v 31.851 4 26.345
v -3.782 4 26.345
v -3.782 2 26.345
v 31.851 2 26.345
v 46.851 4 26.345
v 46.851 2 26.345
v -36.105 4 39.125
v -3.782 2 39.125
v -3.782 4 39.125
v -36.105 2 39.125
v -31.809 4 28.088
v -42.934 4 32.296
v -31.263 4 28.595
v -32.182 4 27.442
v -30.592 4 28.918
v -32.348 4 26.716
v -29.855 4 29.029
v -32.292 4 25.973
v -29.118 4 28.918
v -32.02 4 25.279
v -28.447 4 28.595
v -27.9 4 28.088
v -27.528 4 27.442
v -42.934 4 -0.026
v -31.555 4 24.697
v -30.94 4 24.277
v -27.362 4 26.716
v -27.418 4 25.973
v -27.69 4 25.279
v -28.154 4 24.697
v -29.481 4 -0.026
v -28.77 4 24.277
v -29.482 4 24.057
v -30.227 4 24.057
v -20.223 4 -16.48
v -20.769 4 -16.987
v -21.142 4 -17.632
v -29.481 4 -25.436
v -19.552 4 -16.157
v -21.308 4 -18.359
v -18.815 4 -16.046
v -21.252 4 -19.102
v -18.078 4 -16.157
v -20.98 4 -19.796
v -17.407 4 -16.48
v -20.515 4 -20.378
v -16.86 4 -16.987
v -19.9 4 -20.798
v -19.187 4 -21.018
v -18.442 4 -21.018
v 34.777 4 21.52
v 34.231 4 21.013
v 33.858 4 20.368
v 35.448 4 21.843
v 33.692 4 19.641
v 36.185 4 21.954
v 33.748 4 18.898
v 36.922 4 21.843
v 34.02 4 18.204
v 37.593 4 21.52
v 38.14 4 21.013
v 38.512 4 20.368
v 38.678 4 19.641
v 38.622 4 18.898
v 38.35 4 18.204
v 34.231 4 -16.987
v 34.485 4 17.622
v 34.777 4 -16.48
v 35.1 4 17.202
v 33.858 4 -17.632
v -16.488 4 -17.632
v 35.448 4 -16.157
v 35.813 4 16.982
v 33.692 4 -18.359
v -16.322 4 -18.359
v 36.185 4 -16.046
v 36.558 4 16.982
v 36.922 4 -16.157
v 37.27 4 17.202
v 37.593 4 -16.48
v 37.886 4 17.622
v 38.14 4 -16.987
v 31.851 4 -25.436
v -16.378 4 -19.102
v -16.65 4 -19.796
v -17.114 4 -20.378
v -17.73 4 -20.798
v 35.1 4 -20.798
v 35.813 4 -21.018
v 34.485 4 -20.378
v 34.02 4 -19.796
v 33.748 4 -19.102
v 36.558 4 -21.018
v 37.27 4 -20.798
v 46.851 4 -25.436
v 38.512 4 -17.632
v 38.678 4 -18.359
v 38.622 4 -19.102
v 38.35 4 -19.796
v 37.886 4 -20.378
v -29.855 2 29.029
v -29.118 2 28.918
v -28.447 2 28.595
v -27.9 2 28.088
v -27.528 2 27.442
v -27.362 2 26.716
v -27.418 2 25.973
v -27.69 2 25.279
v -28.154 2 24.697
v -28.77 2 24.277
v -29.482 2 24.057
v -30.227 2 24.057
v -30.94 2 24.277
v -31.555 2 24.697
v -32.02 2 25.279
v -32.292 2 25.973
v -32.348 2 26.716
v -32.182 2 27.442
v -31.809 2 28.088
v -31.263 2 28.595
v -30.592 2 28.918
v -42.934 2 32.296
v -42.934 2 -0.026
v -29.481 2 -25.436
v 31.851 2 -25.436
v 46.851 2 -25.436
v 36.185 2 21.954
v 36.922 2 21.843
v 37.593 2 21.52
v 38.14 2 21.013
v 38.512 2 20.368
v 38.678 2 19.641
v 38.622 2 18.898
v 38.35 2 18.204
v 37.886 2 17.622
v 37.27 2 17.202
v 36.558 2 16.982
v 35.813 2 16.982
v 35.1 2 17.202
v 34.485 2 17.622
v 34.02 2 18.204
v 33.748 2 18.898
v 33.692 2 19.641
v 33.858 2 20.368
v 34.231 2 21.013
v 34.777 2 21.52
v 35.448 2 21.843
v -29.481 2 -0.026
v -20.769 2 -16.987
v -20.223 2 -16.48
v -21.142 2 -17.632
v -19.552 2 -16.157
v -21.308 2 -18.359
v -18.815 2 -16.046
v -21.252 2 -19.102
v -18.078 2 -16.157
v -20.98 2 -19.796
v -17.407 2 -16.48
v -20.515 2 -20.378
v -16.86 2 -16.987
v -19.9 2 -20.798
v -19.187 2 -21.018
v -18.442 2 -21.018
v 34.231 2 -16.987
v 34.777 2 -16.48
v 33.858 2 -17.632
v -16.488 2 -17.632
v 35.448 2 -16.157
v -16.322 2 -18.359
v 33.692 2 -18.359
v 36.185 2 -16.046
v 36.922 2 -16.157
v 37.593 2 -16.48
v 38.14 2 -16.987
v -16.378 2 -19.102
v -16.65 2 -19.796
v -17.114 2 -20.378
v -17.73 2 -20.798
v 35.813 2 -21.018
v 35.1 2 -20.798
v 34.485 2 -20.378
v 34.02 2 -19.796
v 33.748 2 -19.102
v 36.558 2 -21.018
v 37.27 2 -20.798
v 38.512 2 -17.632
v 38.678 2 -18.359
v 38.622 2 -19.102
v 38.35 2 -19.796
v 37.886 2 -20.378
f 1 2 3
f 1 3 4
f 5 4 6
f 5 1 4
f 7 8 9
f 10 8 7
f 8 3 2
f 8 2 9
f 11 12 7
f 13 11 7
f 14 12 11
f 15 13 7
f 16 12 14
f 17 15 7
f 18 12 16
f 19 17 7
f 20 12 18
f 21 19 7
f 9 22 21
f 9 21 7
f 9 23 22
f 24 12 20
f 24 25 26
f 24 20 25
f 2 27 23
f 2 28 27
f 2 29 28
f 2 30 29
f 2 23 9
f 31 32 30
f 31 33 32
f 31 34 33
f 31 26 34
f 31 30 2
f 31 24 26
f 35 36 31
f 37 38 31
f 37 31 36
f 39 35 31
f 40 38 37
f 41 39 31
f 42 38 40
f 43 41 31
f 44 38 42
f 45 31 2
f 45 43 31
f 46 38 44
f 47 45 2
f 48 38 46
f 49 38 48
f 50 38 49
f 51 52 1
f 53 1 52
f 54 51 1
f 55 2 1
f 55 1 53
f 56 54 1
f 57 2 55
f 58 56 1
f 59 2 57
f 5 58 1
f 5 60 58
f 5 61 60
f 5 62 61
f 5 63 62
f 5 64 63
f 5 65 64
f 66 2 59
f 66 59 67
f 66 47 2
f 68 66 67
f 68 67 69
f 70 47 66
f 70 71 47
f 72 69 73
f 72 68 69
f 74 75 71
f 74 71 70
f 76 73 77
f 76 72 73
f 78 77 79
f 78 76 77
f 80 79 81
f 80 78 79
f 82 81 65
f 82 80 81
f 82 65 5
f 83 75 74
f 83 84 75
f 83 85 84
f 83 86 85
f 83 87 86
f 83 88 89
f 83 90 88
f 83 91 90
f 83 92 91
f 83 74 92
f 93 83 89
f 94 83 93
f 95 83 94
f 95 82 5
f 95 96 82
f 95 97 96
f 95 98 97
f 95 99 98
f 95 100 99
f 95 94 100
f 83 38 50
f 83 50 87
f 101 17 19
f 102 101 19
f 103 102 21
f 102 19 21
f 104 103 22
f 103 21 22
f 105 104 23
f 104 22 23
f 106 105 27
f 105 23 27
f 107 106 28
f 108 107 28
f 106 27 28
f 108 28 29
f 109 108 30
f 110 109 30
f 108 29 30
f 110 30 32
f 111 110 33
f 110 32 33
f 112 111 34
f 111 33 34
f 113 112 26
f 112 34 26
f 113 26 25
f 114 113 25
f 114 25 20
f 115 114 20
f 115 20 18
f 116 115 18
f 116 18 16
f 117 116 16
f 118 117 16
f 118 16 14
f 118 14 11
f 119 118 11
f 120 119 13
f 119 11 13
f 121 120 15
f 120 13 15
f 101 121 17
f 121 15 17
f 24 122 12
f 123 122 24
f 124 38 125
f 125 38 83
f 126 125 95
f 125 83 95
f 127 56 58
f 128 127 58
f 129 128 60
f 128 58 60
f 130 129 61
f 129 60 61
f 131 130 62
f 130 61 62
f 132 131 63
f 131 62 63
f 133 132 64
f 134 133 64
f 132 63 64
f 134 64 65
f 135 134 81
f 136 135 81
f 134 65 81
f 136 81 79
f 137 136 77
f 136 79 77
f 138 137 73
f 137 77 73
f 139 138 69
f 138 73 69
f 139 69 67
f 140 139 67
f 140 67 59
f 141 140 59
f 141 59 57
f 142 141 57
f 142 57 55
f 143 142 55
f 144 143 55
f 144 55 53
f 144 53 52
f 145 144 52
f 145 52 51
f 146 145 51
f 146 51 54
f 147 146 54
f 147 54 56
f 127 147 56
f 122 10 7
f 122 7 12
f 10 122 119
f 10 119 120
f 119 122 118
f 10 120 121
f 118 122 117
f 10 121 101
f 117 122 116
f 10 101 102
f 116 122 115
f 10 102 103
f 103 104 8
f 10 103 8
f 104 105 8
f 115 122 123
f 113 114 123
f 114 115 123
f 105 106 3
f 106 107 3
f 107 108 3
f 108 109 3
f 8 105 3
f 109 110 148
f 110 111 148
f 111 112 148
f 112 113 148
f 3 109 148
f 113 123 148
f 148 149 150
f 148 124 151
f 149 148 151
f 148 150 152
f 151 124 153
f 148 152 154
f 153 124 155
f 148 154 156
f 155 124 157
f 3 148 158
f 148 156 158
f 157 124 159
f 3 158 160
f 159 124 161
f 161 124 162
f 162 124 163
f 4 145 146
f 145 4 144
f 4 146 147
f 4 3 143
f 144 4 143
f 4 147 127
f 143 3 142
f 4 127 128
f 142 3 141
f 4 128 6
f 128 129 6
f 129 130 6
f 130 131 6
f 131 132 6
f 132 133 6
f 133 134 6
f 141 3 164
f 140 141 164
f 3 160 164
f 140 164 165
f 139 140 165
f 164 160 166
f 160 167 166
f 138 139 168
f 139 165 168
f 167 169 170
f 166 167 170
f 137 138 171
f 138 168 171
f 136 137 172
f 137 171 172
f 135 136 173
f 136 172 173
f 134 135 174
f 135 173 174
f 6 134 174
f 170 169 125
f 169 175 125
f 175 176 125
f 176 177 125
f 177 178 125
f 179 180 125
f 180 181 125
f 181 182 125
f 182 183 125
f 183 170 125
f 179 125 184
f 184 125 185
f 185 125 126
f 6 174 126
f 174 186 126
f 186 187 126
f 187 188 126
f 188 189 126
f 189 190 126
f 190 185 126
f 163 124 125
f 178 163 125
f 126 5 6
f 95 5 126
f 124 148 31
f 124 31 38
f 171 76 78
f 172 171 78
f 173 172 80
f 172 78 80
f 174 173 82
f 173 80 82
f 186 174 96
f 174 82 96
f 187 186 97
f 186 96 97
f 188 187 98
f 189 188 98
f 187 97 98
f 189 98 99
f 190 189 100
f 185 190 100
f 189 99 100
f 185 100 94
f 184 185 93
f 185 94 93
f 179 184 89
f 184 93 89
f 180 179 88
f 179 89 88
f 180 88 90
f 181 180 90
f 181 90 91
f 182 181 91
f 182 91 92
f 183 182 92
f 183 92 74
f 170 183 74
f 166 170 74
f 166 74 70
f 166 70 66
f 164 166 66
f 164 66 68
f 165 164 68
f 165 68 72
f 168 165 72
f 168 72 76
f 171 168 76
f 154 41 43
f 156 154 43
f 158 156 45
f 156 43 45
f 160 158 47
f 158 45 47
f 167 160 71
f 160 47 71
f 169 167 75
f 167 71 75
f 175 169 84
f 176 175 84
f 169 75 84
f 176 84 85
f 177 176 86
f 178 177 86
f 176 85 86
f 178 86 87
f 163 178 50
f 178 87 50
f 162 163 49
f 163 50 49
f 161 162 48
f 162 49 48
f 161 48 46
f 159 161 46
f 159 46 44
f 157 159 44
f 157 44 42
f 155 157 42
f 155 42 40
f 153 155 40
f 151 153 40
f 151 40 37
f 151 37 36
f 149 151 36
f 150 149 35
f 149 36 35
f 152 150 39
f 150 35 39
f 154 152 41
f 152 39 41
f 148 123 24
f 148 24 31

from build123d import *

# Parameters (mm, degrees)
BOSS_EXTRUDE1_DEPTH = 2
CHAMFER1_SIZE       = 8
BOSS_EXTRUDE2_DEPTH = 2
SKETCH4_W           = 99.768826376
SKETCH4_H           = 91.588754032
CUT_EXTRUDE1_DEPTH  = 2
SKETCH5_R           = 2.5
CUT_EXTRUDE2_DEPTH  = 2
SKETCH6_W           = 15
SKETCH6_H           = 51.780584955
BOSS_EXTRUDE3_DEPTH = 2
SKETCH7_R           = 2.5
CUT_EXTRUDE3_DEPTH  = 62.071622078
SKETCH8_R           = 3.630325665
SKETCH8_R_2         = 3.812865601
BOSS_EXTRUDE4_DEPTH = 2


with BuildPart() as part:
    # Sketch1 → Boss-Extrude1 (new body)
    with BuildSketch(Plane(origin=(0, 0, 0), x_dir=(1, 0, 0), z_dir=(0, 1, 0))):
        Polygon((-1.782487159, -28.34466675), (33.85093234, -28.34466675), (33.85093234, 27.435918205), (-31.480603593, 27.435918205), (-31.480603593, 2.026433414), (-44.933505709, 2.026433414), (-44.933505709, -41.124585136), (-1.782487159, -41.124585136), align=None)
    extrude(amount=BOSS_EXTRUDE1_DEPTH)

    # Chamfer1
    chamfer1_edges = [part.edges().sort_by_distance(p)[0] for p in [
        (-44.933505709, 1, 41.124585136),
    ]]
    chamfer(chamfer1_edges, length=CHAMFER1_SIZE)

    # Sketch3 → Boss-Extrude2 (add)
    with BuildSketch(Plane(origin=(0, 2, 0), x_dir=(1, 0, 0), z_dir=(0, 1, 0))):
        Polygon((-29.480603593, 25.435918205), (31.85093234, 25.435918205), (31.85093234, -26.34466675), (-3.782487159, -26.34466675), (-3.782487159, -39.124585136), (-36.105078585, -39.124585136), (-42.933505709, -32.296158012), (-42.933505709, 0.026433414), (-29.480603593, 0.026433414), align=None)
    extrude(amount=BOSS_EXTRUDE2_DEPTH)

    # Sketch4 → Cut-Extrude1 (cut)
    with BuildSketch(Plane.XZ):
        Rectangle(SKETCH4_W, SKETCH4_H)
    extrude(amount=-CUT_EXTRUDE1_DEPTH, mode=Mode.SUBTRACT)

    # Sketch5 → Cut-Extrude2 (cut)
    with BuildSketch(Plane(origin=(0, 4, 0), x_dir=(1, 0, 0), z_dir=(0, 1, 0))):
        with Locations(Location((-18.814835626, 18.545625727, 0), (0, 0, 270))):
            Circle(SKETCH5_R)
        with Locations(Location((21.185164374, 18.545625727, 0), (0, 0, 270))):
            Circle(SKETCH5_R)
        with Locations(Location((21.185164374, -19.454374273, 0), (0, 0, 270))):
            Circle(SKETCH5_R)
        with Locations(Location((-29.854835626, -26.529137879, 0), (0, 0, 270))):
            Circle(SKETCH5_R)
    extrude(amount=-CUT_EXTRUDE2_DEPTH, mode=Mode.SUBTRACT)

    # Sketch6 → Boss-Extrude3 (add)
    with BuildSketch(Plane(origin=(0, 4, 0), x_dir=(1, 0, 0), z_dir=(0, 1, 0))):
        with Locations((39.35093234, -0.454374273)):
            Rectangle(SKETCH6_W, SKETCH6_H)
    extrude(amount=-BOSS_EXTRUDE3_DEPTH)

    # Sketch7 → Cut-Extrude3 (cut, through all)
    with BuildSketch(Plane(origin=(0, 4, 0), x_dir=(1, 0, 0), z_dir=(0, 1, 0))):
        with Locations(Location((36.185164374, 18.545625727, 0), (0, 0, 270))):
            Circle(SKETCH7_R)
        with Locations(Location((36.185164374, -19.454374273, 0), (0, 0, 270))):
            Circle(SKETCH7_R)
    extrude(amount=-CUT_EXTRUDE3_DEPTH, mode=Mode.SUBTRACT)

    # Sketch8 → Boss-Extrude4 (add)
    with BuildSketch(Plane(origin=(0, 4, 0), x_dir=(1, 0, 0), z_dir=(0, 1, 0))):
        with Locations((21.185164374, 18.545625727)):
            Circle(SKETCH8_R)
        with Locations((21.185164374, -19.454374273)):
            Circle(SKETCH8_R_2)
    extrude(amount=-BOSS_EXTRUDE4_DEPTH)


solid = part.part
